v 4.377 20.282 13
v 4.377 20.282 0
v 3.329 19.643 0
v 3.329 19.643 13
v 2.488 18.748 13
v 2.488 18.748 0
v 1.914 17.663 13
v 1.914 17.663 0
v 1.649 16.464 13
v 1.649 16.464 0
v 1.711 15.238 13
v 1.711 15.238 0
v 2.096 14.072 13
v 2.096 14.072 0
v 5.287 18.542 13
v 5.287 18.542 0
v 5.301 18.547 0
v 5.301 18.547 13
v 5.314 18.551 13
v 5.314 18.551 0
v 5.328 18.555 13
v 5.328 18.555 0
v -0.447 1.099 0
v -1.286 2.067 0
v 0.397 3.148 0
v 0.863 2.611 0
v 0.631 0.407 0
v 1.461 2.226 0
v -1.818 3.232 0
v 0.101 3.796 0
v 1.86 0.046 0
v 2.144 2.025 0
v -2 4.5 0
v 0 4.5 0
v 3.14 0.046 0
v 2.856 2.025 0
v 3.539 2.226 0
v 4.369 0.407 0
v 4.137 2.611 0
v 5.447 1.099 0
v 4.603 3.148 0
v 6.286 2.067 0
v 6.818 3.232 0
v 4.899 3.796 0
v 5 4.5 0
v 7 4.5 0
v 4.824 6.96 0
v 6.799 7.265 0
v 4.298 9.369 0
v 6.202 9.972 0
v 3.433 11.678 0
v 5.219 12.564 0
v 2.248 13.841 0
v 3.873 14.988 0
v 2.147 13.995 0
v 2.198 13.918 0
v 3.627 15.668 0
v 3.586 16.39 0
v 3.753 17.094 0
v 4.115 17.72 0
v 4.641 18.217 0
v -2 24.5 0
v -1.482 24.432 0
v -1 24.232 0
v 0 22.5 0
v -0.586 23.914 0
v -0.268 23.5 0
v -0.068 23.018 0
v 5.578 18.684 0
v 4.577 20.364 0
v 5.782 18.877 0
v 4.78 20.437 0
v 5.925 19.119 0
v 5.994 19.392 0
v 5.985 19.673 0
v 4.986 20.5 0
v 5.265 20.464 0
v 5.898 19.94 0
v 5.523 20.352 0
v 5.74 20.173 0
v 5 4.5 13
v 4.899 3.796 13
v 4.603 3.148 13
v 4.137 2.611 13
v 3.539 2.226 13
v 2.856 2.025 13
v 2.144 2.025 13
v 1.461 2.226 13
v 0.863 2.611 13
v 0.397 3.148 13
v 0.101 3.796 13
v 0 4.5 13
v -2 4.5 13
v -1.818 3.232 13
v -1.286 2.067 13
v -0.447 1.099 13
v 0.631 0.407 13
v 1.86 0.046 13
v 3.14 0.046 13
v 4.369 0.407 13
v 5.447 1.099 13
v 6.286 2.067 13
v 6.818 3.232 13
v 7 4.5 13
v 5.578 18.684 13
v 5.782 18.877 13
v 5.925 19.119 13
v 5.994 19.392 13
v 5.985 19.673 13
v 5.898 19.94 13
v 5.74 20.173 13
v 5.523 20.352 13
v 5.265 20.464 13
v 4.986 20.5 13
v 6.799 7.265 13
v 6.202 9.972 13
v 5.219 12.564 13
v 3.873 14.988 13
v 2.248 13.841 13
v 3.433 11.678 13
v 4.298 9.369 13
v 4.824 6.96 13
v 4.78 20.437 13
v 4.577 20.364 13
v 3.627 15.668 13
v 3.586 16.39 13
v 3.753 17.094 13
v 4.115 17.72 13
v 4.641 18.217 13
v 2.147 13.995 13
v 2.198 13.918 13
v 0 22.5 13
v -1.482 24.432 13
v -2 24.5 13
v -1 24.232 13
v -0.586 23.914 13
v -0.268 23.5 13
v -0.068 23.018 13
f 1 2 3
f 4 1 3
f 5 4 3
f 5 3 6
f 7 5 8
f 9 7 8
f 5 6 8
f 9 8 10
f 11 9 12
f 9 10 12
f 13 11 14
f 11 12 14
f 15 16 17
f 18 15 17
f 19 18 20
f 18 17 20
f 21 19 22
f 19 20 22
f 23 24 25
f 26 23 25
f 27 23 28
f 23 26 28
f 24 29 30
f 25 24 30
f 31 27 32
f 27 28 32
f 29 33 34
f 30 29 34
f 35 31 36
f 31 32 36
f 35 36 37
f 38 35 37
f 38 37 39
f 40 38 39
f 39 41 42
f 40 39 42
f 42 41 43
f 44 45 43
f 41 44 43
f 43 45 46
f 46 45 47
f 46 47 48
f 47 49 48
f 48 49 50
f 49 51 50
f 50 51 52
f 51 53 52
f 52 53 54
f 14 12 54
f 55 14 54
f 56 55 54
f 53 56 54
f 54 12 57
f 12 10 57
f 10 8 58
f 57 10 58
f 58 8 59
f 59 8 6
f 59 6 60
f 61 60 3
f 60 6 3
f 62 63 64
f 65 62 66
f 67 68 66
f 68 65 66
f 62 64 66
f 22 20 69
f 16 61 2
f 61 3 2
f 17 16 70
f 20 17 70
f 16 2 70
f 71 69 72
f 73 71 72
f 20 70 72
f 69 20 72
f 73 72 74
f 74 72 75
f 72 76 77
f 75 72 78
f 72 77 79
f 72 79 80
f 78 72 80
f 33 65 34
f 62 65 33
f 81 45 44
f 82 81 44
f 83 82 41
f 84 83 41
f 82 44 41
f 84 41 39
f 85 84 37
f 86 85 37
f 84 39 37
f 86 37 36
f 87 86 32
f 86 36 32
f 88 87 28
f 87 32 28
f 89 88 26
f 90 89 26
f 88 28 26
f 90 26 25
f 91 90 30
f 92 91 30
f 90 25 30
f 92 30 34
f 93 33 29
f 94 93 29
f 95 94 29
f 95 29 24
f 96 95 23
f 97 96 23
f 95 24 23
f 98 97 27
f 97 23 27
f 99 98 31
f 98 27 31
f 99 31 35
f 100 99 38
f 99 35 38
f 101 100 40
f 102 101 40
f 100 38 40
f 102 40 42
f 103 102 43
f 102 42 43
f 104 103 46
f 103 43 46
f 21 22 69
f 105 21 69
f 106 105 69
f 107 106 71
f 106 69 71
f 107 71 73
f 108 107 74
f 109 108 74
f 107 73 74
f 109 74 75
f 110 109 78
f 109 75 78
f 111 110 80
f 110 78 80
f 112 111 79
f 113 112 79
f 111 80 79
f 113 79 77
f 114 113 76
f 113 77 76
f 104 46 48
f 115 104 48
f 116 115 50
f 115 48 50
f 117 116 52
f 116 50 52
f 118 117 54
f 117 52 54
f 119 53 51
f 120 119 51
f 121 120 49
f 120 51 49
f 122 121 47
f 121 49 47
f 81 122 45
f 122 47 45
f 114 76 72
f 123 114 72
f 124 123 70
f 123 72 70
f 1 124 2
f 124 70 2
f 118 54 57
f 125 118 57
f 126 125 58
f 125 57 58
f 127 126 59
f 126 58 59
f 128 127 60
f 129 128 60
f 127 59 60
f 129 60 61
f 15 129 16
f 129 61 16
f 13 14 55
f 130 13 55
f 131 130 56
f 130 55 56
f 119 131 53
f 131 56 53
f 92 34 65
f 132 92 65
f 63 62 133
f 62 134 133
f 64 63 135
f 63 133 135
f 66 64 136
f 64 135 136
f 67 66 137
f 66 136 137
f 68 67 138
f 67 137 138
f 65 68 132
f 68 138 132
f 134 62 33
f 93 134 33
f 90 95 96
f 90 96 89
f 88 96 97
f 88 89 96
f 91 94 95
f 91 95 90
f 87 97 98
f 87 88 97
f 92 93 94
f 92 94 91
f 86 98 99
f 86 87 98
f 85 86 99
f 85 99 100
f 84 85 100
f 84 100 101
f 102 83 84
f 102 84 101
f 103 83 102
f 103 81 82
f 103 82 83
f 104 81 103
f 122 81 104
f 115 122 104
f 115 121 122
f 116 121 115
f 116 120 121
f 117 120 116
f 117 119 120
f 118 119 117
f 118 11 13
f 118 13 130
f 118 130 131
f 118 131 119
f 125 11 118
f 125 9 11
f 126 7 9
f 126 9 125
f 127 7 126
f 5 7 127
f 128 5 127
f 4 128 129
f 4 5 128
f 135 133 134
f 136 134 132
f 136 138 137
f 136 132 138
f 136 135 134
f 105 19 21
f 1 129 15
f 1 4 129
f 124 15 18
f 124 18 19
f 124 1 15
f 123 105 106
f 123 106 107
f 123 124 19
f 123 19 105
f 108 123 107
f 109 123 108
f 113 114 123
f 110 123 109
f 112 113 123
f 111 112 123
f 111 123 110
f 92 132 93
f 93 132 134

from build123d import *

# Parameters (mm, degrees)
F1_DEPTH = 13
F2_R     = 1.99999


# Not quite as in the source:
# - a fillet or chamfer is up to 0.001 mm smaller than in the source, because OpenCascade refuses the exact size


with BuildPart() as f1:
    # F0 (on Top) → F1 (new body)
    with BuildSketch(Plane.XY):
        with BuildLine():
            Line((0, 10), (0, 24.5))
            Line((0, 24.5), (-2, 24.5))
            Line((-2, 24.5), (-2, 4.5))
            ThreePointArc((-2, 4.5), (2.5, 0), (7, 4.5))
            ThreePointArc((7, 4.5), (6.2015841123, 9.9720743607), (3.8729089523, 14.9878831427))
            ThreePointArc((3.8729089523, 14.9878831427), (3.7530227087, 17.0940905495), (5.2871913605, 18.5421267712))
            ThreePointArc((5.2871913605, 18.5421267712), (5.3073257689, 18.5487259027), (5.3275153833, 18.5551541535))
            ThreePointArc((5.3275153833, 18.5551541535), (5.9849559235, 19.6728057544), (4.9863180052, 20.4999063971))
            ThreePointArc((4.9863180052, 20.4999063971), (4.6777817893, 20.4017930021), (4.3769319754, 20.2821676525))
            ThreePointArc((4.3769319754, 20.2821676525), (1.9143946428, 17.6625142897), (2.0963385188, 14.0717524929))
            ThreePointArc((2.0963385188, 14.0717524929), (2.172582587, 13.95665433), (2.2479018586, 13.8409488747))
            ThreePointArc((2.2479018586, 13.8409488747), (4.2976593275, 9.3689672945), (5, 4.5))
            ThreePointArc((5, 4.5), (2.5, 2), (0, 4.5))
            Line((0, 4.5), (0, 10))
        make_face()
    extrude(amount=F1_DEPTH)

    # F2 (radius 2 in the source; OpenCascade refuses exactly that, so slightly less here)
    f2_edges = [f1.edges().sort_by_distance(p)[0] for p in [
        (0, 24.5, 6.5),
    ]]
    fillet(f2_edges, radius=F2_R)


solid = f1.part
